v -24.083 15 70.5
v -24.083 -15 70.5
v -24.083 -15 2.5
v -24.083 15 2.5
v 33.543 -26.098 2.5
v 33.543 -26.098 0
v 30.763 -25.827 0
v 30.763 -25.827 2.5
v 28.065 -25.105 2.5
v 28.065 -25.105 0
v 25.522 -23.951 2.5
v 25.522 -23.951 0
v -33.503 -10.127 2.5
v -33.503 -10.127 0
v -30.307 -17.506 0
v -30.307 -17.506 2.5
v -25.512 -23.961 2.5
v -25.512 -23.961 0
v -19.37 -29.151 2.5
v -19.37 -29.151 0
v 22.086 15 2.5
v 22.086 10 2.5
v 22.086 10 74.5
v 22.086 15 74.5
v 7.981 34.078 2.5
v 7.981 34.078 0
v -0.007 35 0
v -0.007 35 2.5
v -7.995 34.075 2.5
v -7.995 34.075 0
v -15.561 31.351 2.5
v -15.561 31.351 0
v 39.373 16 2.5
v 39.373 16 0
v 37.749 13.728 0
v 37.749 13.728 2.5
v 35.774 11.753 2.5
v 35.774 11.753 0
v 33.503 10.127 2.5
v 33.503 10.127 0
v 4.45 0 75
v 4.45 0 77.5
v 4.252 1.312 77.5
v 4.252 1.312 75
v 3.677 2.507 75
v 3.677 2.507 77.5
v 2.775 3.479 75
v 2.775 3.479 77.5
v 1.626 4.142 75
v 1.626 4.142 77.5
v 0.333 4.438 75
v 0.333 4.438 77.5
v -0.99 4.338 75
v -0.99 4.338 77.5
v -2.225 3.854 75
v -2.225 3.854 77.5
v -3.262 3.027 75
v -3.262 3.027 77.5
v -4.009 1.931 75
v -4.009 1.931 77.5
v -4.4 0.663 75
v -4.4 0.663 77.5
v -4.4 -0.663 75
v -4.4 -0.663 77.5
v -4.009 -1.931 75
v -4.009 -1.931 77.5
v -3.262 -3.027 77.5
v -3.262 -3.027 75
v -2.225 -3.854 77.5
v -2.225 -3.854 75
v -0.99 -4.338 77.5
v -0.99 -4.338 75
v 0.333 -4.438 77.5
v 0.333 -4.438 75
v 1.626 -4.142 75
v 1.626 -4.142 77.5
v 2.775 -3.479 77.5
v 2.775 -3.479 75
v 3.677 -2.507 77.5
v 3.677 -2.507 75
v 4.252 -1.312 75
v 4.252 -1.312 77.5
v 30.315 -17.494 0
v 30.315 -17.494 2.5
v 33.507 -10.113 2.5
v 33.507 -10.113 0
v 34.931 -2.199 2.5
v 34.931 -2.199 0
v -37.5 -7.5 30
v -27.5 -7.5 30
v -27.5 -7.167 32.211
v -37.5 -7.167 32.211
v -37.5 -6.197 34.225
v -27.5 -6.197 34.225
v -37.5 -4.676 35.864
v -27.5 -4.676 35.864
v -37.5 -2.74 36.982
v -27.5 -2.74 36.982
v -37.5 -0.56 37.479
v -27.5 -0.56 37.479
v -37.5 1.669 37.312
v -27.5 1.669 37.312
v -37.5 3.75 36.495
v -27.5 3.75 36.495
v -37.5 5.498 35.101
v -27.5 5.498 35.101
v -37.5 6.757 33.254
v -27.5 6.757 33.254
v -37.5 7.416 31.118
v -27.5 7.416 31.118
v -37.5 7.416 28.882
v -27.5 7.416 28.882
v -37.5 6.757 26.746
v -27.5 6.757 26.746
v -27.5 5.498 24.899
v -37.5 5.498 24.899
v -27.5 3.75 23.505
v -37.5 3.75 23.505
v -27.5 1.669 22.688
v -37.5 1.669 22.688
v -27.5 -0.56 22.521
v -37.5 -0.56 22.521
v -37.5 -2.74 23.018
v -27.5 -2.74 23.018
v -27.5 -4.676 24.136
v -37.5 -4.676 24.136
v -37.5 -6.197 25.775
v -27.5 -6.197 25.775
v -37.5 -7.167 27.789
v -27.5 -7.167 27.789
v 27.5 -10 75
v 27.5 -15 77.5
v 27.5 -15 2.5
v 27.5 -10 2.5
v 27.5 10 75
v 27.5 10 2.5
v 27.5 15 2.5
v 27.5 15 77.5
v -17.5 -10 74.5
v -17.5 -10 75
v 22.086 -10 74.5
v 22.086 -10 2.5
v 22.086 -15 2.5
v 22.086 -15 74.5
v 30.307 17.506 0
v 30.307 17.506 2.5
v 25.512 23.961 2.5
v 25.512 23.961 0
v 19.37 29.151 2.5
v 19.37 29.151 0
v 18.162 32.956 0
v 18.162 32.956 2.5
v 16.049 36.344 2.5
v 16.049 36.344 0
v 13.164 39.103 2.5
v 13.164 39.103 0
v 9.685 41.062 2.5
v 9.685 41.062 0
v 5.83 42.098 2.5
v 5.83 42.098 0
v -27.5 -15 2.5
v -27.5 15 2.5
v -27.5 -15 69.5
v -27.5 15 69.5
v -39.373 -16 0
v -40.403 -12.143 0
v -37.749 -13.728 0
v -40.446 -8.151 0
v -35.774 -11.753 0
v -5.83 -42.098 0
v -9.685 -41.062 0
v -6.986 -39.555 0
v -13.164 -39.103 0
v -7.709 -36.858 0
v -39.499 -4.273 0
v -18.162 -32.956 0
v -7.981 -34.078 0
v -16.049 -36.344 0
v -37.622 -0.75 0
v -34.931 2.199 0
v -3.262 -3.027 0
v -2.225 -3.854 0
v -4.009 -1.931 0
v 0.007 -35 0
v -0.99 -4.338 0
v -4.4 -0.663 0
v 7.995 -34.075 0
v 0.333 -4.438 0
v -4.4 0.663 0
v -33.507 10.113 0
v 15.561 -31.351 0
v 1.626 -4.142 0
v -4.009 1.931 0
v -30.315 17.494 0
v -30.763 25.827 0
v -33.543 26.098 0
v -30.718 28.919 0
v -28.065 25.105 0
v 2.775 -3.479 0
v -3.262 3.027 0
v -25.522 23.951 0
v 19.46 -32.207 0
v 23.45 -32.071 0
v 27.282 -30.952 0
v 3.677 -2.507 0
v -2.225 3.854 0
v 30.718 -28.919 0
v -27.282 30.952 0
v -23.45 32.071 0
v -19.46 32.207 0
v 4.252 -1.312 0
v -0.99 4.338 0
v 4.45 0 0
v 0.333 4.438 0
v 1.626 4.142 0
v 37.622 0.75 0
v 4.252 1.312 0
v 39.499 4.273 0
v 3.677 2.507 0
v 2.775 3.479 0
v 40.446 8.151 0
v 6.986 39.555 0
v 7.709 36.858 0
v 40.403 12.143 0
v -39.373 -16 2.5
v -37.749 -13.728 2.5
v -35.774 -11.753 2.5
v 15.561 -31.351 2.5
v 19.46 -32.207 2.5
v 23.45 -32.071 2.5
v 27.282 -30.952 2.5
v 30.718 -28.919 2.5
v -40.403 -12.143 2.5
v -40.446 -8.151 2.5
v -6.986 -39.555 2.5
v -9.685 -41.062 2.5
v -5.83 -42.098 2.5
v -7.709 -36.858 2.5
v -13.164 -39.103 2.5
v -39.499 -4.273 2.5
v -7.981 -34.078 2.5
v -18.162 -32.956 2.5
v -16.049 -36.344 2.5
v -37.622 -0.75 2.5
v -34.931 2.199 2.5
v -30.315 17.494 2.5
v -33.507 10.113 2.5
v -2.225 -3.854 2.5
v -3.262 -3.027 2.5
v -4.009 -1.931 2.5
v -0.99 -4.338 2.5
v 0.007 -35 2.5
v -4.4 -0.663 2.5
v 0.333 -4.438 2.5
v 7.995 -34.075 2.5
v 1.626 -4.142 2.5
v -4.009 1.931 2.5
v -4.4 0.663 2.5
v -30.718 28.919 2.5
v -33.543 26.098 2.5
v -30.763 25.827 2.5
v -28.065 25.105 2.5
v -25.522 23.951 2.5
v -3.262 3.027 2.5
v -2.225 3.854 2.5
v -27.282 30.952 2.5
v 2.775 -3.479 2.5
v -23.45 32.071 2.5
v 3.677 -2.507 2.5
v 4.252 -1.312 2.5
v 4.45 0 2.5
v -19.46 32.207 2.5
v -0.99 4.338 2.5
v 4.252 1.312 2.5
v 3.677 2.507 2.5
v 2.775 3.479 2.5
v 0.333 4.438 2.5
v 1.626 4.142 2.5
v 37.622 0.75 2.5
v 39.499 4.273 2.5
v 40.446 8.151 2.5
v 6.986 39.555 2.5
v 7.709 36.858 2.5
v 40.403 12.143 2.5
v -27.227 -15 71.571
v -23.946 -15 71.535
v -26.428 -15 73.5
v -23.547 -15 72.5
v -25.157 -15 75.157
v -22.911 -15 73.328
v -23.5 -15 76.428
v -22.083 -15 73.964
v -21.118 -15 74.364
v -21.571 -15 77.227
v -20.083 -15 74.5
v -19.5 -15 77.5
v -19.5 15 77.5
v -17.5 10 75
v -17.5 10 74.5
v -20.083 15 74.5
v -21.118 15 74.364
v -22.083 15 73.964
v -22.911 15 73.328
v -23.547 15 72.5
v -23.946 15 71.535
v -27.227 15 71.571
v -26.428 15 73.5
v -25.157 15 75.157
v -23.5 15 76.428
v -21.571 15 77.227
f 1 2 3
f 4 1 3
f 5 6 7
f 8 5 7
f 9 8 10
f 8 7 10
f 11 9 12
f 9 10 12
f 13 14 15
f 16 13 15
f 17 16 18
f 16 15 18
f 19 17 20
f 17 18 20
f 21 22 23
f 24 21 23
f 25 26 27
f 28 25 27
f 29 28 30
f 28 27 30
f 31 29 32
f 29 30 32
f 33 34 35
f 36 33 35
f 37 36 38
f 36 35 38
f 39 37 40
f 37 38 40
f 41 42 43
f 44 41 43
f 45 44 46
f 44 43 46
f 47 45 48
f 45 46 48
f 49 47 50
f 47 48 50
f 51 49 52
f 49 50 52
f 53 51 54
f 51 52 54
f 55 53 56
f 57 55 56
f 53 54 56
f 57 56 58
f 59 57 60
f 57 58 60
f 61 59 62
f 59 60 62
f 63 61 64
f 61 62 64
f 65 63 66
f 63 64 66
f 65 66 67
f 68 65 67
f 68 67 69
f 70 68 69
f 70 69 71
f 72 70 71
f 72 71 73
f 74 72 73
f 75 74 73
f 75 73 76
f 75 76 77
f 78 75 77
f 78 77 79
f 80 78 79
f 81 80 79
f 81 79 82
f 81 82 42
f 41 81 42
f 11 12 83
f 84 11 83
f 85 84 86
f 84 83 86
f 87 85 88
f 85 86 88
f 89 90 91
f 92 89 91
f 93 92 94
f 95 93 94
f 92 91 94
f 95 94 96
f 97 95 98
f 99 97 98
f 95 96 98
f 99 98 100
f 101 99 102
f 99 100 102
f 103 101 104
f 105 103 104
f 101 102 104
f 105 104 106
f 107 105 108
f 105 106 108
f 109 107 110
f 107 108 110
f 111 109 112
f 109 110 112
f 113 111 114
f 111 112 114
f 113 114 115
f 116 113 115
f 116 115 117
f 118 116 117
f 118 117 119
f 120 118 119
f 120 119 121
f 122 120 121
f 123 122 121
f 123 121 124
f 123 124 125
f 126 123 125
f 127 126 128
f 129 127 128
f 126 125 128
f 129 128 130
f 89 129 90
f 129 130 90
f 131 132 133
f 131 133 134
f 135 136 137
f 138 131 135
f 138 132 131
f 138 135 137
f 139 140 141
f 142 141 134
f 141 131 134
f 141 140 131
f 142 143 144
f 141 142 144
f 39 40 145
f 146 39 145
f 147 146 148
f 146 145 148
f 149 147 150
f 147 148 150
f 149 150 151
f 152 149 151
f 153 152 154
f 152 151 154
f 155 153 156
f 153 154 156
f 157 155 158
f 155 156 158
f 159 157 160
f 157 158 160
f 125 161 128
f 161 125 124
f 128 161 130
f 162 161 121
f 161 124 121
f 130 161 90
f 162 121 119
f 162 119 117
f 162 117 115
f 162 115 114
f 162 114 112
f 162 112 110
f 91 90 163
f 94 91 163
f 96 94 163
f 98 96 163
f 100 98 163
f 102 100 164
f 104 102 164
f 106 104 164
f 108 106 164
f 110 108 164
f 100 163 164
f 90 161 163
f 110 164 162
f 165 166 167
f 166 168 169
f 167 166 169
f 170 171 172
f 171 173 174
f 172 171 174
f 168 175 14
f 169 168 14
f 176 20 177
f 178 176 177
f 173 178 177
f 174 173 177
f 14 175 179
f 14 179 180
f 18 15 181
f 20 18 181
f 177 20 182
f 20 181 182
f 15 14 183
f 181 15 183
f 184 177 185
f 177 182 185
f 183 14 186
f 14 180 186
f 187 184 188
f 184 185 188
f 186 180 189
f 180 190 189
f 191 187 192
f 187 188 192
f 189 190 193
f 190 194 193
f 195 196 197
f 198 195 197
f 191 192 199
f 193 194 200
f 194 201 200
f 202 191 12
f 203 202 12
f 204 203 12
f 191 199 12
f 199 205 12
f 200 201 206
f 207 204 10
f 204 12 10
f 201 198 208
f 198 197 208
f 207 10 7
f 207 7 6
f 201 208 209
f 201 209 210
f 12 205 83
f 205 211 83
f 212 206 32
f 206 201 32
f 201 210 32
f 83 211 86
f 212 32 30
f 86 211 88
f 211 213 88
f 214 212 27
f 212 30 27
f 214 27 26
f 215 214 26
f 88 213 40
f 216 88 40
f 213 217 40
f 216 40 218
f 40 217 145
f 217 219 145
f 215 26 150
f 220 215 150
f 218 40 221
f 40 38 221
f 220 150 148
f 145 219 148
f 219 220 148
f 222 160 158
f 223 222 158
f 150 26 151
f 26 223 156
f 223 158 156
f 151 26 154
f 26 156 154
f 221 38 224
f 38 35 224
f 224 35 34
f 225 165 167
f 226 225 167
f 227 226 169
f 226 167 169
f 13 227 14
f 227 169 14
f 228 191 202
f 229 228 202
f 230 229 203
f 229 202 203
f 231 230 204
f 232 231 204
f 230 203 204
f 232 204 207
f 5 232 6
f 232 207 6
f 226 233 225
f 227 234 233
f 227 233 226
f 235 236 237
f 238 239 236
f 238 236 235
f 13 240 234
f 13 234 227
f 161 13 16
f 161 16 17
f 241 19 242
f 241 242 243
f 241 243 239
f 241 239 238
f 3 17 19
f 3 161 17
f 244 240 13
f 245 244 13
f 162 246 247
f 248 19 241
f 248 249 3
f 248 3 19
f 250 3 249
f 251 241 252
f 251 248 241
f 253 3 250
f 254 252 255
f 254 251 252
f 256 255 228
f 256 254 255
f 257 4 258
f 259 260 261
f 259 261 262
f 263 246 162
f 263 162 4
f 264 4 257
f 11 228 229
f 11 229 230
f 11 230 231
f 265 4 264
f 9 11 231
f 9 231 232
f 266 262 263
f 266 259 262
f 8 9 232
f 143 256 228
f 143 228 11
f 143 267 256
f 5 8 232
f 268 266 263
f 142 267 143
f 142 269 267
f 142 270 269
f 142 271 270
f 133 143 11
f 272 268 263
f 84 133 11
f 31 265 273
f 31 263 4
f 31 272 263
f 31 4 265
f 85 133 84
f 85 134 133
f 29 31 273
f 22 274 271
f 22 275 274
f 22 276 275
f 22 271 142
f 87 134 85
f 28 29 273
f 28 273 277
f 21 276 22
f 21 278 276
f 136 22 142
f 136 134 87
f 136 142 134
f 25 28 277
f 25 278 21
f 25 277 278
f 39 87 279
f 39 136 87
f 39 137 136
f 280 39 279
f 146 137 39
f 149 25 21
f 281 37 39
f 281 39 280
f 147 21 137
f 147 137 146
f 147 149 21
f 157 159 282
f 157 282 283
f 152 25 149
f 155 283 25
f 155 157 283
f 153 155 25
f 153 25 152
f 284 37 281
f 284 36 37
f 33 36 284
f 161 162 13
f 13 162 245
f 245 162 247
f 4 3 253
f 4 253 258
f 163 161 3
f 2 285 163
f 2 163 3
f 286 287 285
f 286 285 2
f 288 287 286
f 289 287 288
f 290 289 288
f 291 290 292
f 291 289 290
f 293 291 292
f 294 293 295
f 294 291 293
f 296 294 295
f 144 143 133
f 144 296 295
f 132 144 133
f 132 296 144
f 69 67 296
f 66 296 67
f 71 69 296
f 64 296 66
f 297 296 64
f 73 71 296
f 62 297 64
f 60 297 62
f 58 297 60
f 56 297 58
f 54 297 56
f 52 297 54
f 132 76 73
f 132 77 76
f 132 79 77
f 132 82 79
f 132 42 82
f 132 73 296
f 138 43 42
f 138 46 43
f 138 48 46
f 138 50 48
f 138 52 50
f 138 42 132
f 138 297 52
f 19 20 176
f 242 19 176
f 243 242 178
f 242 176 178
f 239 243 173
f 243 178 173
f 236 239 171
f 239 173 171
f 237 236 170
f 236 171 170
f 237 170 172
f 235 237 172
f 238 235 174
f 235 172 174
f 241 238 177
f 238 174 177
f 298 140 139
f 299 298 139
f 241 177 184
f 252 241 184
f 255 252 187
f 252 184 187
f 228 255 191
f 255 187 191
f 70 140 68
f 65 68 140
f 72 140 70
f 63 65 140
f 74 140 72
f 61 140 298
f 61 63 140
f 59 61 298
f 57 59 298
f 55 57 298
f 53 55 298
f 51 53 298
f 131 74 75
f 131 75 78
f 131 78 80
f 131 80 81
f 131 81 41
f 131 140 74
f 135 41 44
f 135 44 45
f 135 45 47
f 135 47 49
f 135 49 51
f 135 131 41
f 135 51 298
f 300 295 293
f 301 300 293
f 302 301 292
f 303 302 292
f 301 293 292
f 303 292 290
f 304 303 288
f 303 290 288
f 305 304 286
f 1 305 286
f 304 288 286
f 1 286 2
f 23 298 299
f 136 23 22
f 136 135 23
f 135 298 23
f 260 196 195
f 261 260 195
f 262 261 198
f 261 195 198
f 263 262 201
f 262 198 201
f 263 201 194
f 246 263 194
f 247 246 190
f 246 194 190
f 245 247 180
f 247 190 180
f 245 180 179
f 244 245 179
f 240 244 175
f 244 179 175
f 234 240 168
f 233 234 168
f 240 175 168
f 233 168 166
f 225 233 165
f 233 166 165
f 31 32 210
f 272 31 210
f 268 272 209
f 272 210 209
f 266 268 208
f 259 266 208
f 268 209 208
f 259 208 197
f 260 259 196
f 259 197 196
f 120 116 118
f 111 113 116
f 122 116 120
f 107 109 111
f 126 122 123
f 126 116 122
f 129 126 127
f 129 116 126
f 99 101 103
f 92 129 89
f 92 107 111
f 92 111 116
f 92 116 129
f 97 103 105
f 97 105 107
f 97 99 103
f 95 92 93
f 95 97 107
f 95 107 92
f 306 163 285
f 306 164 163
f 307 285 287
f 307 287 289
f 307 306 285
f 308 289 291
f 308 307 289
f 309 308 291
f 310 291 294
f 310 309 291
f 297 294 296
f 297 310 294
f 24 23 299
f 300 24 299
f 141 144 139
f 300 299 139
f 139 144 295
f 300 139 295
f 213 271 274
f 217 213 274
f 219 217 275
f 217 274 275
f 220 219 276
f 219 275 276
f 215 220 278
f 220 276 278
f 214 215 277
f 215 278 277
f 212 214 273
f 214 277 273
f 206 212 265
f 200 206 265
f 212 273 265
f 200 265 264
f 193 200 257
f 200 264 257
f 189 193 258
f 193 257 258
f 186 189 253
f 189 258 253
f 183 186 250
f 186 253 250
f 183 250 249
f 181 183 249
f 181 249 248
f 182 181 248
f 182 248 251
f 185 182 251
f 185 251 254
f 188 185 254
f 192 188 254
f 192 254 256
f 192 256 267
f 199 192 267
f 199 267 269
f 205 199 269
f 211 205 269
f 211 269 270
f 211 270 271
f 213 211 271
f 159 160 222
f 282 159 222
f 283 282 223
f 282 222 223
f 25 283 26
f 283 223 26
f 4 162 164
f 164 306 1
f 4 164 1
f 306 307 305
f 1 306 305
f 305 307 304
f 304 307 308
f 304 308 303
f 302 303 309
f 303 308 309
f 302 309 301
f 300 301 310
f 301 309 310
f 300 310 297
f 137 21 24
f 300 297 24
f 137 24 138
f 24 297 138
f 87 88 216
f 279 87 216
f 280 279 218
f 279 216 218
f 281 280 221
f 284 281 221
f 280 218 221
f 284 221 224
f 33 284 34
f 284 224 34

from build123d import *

# Parameters (mm, degrees)
SKETCH1_R           = 35
BOSS_EXTRUDE1_DEPTH = 2.5
SKETCH11_R          = 4.45
CUT_EXTRUDE5_DEPTH  = 10
BOSS_EXTRUDE4_START = 75
SKETCH5_W           = 55
SKETCH5_H           = 30
SKETCH5_R           = 4.45
BOSS_EXTRUDE4_DEPTH = 75
SKETCH6_W           = 72.5
SKETCH6_H           = 20
CUT_EXTRUDE2_DEPTH  = 45
SKETCH7_R           = 7.5
BOSS_EXTRUDE5_DEPTH = 10
CUT_EXTRUDE3_DEPTH  = 30
FILLET1_R           = 8


with BuildPart() as part:
    # Sketch1 → Boss-Extrude1 (new body)
    with BuildSketch(Plane.XY):
        with BuildLine():
            ThreePointArc((-33.502769568, -10.1274099), (-34.767453022, -4.027928789), (-34.930842804, 2.199140974))
            ThreePointArc((-34.930842804, 2.199140974), (-40.093982991, -6.182304711), (-39.373214245, -16))
            ThreePointArc((-39.373214245, -16), (-36.802059341, -12.69977052), (-33.502769568, -10.1274099))
        make_face()
        Circle(SKETCH1_R)
        with BuildLine():
            ThreePointArc((-25.521979032, 23.950544593), (-20.872015167, 28.095533148), (-15.560909452, 31.350567731))
            ThreePointArc((-15.560909452, 31.350567731), (-25.401024429, 31.631255454), (-33.543013583, 26.098203765))
            ThreePointArc((-33.543013583, 26.098203765), (-29.399353563, 25.521633041), (-25.521979032, 23.950544593))
        make_face()
        with BuildLine():
            ThreePointArc((7.980790536, 34.077954493), (13.895437855, 32.123461937), (19.369933352, 29.151426756))
            ThreePointArc((19.369933352, 29.151426756), (14.692958562, 37.813560165), (5.830200662, 42.098203765))
            ThreePointArc((5.830200662, 42.098203765), (7.402705778, 38.221403561), (7.980790536, 34.077954493))
        make_face()
        with BuildLine():
            ThreePointArc((34.930842804, -2.199140974), (40.093982991, 6.182304711), (39.373214245, 16))
            ThreePointArc((39.373214245, 16), (36.802059341, 12.69977052), (33.502769568, 10.1274099))
            ThreePointArc((33.502769568, 10.1274099), (34.623669179, 5.11874326), (35, 0))
            ThreePointArc((35, 0), (34.982706429, -1.100114056), (34.930842804, -2.199140974))
        make_face()
        with BuildLine():
            ThreePointArc((33.543013583, -26.098203765), (29.399353563, -25.521633041), (25.521979032, -23.950544593))
            ThreePointArc((25.521979032, -23.950544593), (20.872015167, -28.095533148), (15.560909452, -31.350567731))
            ThreePointArc((15.560909452, -31.350567731), (25.401024429, -31.631255454), (33.543013583, -26.098203765))
        make_face()
        with BuildLine():
            ThreePointArc((-5.830200662, -42.098203765), (-7.402705778, -38.221403561), (-7.980790536, -34.077954493))
            ThreePointArc((-7.980790536, -34.077954493), (-13.895437855, -32.123461937), (-19.369933352, -29.151426756))
            ThreePointArc((-19.369933352, -29.151426756), (-14.692958562, -37.813560165), (-5.830200662, -42.098203765))
        make_face()
    extrude(amount=BOSS_EXTRUDE1_DEPTH)

    # Sketch11 → Cut-Extrude5 (cut)
    with BuildSketch(Plane.XY.offset(2.5)):
        Circle(SKETCH11_R)
    extrude(amount=-CUT_EXTRUDE5_DEPTH, mode=Mode.SUBTRACT)

    # Sketch5 → Boss-Extrude4 (add)
    with BuildSketch(Plane.XY.offset(2.5).offset(BOSS_EXTRUDE4_START)):
        Rectangle(SKETCH5_W, SKETCH5_H)
        Circle(SKETCH5_R, mode=Mode.SUBTRACT)
    extrude(amount=-BOSS_EXTRUDE4_DEPTH)

    # Sketch6 → Cut-Extrude2 (cut)
    with BuildSketch(Plane(origin=(27.5, 0, 0), x_dir=(0, 0, -1), z_dir=(1, 0, 0))):
        with Locations((-38.75, 0)):
            Rectangle(SKETCH6_W, SKETCH6_H)
    extrude(amount=-CUT_EXTRUDE2_DEPTH, mode=Mode.SUBTRACT)

    # Sketch7 → Boss-Extrude5 (add)
    with BuildSketch(Plane.ZY.offset(27.5)):
        with Locations(Location((30, 0, 0), (0, 0, 270))):
            Circle(SKETCH7_R)
    extrude(amount=BOSS_EXTRUDE5_DEPTH)

    # Sketch8 → Cut-Extrude3 (cut)
    with BuildSketch(Plane.XZ.offset(15)):
        with BuildLine():
            Line((-24.082664687, 70.5), (-24.082664687, 2.5))
            Line((-24.082664687, 2.5), (22.085730974, 2.5))
            Line((22.085730974, 2.5), (22.085730974, 74.5))
            Line((22.085730974, 74.5), (-20.082664687, 74.5))
            ThreePointArc((-20.082664687, 74.5), (-22.911091812, 73.328427125), (-24.082664687, 70.5))
        make_face()
    extrude(amount=-CUT_EXTRUDE3_DEPTH, mode=Mode.SUBTRACT)

    # Fillet1
    fillet1_edges = [part.edges().sort_by_distance(p)[0] for p in [
        (-27.5, 0, 77.5),
    ]]
    fillet(fillet1_edges, radius=FILLET1_R)


solid = part.part
